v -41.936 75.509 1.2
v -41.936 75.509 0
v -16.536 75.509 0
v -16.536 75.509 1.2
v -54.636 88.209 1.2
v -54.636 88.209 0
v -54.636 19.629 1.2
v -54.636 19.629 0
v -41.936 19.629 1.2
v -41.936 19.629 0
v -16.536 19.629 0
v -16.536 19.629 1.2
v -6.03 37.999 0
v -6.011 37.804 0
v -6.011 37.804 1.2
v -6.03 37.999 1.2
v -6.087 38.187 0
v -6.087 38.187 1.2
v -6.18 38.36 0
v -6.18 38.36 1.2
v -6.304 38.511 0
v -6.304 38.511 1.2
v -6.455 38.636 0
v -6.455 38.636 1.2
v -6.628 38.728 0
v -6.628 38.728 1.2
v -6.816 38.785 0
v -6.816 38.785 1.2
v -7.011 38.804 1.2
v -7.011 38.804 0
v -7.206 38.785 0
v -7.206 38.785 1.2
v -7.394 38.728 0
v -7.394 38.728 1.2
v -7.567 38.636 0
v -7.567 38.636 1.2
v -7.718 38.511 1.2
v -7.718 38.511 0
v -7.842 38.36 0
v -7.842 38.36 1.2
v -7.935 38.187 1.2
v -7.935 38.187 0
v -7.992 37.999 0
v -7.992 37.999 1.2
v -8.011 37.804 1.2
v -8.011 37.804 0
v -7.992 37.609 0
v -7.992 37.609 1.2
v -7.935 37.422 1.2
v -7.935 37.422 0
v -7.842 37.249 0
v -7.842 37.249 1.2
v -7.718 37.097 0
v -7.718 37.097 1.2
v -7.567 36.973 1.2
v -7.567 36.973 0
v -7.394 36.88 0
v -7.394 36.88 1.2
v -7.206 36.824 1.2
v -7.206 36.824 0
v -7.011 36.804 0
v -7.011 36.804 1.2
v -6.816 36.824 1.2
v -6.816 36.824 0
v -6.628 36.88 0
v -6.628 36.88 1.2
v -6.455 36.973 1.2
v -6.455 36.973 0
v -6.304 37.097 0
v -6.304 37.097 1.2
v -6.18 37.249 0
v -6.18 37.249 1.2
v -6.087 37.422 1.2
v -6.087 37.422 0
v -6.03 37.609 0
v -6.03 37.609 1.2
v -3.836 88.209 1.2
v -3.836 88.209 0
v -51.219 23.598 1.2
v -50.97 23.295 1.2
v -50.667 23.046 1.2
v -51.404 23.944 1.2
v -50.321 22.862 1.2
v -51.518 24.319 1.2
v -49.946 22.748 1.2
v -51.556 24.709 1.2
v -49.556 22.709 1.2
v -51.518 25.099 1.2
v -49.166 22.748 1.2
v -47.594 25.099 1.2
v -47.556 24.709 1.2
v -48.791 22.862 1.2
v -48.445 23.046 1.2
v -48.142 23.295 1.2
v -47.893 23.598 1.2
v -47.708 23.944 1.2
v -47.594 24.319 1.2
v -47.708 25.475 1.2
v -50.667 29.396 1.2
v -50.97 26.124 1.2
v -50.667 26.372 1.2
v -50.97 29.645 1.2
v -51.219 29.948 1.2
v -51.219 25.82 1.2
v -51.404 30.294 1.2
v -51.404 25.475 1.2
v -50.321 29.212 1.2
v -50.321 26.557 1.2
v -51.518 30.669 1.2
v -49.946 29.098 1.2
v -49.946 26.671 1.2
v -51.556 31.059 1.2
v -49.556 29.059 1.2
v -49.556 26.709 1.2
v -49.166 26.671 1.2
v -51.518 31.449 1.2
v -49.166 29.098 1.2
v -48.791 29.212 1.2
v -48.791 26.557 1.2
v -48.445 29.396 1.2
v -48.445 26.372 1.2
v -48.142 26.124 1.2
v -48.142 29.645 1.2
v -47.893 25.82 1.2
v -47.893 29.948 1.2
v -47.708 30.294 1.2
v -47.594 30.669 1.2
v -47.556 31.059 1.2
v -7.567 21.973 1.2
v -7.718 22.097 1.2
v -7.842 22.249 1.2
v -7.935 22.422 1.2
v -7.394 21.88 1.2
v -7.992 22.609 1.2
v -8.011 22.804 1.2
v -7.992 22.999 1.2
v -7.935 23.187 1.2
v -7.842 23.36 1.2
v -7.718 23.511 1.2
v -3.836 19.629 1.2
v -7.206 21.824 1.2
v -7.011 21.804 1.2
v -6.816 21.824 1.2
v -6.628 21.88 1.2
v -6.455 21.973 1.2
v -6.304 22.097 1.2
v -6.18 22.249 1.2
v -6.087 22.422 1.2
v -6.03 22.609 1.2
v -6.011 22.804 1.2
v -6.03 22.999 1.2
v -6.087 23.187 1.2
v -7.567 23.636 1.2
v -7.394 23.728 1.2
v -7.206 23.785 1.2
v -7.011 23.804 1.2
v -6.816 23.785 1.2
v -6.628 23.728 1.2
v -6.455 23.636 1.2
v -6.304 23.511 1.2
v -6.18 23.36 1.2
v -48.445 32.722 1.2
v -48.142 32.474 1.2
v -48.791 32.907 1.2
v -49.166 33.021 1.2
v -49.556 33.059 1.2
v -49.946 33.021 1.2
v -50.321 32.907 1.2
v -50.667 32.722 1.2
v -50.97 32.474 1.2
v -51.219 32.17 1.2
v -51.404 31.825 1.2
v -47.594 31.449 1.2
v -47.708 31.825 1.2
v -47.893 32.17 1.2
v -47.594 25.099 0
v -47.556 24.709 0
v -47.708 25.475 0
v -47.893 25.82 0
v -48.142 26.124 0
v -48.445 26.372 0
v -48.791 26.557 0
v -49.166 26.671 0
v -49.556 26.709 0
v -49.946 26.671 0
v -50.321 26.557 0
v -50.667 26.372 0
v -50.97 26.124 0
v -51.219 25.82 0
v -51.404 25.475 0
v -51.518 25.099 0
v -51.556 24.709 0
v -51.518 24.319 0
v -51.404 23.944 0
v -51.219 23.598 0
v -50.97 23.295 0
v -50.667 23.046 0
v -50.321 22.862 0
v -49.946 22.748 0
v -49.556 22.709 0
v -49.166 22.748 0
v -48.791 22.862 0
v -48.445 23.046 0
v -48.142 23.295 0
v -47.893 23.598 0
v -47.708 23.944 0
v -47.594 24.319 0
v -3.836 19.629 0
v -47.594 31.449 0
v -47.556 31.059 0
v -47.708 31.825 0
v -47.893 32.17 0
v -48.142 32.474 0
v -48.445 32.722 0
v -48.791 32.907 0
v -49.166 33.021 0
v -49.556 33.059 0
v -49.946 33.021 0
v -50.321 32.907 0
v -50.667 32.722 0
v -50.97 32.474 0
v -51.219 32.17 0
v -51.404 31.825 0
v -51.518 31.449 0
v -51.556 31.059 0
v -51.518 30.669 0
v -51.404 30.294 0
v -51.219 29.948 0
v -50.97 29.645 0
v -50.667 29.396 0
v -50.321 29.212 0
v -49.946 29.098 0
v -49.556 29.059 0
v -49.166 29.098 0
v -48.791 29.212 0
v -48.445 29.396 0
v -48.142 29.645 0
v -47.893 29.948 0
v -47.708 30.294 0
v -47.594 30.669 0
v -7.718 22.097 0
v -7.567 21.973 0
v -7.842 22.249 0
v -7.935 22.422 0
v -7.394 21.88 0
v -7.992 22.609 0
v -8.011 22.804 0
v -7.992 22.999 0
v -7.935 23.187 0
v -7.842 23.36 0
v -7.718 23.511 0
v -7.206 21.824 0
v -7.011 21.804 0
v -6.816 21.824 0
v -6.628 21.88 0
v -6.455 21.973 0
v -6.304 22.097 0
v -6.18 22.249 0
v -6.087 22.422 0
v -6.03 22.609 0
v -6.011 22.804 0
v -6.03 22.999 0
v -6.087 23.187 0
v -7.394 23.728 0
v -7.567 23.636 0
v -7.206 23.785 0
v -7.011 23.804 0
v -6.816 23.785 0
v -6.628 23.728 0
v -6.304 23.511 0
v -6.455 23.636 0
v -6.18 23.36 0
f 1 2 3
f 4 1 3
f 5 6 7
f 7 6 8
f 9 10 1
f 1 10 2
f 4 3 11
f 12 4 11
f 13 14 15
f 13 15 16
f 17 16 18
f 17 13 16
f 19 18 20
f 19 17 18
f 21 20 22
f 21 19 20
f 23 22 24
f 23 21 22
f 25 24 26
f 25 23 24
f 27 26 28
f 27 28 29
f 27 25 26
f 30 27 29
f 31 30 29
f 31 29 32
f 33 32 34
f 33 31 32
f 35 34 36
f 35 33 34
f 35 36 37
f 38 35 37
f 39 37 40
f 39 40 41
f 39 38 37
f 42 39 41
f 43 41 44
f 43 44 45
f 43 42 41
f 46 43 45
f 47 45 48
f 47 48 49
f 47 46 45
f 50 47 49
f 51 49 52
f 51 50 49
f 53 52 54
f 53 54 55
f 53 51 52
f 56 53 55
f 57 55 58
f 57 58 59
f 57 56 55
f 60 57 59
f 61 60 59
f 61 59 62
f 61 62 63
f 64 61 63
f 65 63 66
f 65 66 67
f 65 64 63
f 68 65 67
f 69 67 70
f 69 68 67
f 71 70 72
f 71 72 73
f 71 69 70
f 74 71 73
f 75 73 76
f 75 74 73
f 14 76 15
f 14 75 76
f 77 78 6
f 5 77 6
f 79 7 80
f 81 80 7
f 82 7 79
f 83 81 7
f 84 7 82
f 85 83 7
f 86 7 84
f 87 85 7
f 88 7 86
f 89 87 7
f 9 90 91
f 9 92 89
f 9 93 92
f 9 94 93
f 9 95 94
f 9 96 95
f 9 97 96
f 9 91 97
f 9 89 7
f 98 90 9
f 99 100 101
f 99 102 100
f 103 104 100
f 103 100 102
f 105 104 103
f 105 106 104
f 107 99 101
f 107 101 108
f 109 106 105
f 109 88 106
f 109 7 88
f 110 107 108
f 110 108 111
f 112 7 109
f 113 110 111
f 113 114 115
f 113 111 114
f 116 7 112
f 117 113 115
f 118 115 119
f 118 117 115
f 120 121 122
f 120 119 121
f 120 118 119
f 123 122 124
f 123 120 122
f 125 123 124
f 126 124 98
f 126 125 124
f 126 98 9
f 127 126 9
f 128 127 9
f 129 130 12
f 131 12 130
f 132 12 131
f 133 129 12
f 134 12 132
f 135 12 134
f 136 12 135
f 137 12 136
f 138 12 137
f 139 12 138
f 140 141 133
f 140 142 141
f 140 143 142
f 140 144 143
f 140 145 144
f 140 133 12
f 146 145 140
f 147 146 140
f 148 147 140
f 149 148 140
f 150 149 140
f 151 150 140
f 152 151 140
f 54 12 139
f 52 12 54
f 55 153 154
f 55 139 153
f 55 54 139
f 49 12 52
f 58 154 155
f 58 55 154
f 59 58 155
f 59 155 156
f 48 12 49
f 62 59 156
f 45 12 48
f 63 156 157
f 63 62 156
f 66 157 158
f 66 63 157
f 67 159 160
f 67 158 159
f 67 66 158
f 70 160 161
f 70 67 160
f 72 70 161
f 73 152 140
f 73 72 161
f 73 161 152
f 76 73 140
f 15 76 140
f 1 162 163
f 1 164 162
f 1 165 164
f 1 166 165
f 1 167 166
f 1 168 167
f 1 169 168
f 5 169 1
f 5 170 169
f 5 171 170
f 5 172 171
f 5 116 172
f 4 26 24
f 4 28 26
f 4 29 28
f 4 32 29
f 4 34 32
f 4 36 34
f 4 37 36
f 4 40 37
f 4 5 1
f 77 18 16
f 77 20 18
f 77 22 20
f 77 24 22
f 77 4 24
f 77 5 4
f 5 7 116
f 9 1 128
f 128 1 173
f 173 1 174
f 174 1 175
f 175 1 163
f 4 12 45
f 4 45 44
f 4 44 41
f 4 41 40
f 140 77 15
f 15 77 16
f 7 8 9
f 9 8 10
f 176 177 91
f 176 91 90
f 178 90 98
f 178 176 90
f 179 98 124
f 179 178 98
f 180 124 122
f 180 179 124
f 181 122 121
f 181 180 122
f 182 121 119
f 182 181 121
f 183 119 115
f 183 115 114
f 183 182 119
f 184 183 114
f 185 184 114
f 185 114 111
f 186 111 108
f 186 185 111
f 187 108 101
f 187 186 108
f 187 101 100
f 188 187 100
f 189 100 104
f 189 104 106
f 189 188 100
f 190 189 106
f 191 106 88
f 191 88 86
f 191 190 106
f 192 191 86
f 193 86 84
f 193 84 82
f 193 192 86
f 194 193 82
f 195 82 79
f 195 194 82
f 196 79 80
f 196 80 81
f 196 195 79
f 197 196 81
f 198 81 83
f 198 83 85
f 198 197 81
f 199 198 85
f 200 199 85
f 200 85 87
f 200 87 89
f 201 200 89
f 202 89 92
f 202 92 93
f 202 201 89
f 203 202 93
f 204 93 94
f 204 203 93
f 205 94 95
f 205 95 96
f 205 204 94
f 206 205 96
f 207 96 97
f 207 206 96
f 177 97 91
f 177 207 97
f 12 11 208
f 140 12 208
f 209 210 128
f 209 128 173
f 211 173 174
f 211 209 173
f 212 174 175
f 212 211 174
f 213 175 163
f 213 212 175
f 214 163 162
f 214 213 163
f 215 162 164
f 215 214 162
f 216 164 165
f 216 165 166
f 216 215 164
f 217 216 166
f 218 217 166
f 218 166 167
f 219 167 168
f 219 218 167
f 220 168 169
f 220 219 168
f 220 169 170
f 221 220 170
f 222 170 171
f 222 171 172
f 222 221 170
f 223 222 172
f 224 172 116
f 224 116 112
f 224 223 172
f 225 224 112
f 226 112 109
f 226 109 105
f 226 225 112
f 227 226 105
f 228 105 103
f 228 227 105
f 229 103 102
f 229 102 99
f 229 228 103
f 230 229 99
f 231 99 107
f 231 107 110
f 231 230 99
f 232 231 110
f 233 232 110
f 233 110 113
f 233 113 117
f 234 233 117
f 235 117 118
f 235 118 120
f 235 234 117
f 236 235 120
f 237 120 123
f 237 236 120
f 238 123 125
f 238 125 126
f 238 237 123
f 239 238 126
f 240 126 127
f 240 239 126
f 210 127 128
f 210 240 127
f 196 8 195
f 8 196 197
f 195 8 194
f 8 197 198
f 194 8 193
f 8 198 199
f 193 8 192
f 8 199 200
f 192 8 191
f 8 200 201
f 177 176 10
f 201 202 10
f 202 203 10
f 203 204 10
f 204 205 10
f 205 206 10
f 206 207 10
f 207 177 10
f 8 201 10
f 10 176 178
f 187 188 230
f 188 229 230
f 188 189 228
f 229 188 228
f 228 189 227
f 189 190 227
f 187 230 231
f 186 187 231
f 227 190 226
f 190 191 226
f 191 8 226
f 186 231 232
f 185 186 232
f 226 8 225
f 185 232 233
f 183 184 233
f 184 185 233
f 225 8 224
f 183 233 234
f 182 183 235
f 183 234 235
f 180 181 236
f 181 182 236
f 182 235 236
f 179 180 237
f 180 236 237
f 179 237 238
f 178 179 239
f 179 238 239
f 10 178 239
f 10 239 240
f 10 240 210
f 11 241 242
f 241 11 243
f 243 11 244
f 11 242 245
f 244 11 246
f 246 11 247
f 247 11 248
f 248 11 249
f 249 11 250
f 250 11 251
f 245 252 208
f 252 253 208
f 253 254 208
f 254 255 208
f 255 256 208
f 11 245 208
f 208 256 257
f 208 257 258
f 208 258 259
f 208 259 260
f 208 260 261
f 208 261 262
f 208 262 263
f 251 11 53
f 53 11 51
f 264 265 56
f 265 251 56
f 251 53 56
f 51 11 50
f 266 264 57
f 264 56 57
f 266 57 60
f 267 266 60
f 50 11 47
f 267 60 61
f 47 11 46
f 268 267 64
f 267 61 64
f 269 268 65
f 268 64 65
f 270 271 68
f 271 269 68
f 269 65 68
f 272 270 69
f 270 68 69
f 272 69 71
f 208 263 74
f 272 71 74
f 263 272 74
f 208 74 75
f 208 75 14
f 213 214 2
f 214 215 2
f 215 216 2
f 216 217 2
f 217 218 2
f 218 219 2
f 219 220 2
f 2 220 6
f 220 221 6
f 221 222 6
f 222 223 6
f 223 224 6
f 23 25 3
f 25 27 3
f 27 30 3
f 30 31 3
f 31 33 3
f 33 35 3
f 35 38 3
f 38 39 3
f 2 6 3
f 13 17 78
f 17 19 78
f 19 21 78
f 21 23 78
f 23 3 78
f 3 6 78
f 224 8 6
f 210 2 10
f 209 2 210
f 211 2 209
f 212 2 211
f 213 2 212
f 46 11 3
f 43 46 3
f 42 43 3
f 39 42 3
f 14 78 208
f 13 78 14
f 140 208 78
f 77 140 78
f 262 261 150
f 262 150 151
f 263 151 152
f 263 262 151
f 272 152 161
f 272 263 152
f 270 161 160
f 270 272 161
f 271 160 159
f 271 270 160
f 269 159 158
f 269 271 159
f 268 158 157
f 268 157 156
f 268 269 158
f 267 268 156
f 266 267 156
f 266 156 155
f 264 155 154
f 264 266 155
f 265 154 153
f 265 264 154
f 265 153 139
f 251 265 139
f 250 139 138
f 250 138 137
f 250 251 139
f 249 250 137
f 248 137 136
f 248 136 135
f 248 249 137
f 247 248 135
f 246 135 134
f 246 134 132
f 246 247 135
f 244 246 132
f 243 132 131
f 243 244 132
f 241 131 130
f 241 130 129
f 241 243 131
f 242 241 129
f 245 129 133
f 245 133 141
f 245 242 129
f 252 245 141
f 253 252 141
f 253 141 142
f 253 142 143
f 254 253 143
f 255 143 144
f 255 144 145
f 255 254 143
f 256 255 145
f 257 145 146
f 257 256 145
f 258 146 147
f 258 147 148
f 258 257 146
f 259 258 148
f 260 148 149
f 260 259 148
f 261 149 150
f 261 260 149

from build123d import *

# Parameters (mm, degrees)
F0_R     = 2
F0_R_2   = 1
F1_DEPTH = 1.2


with BuildPart() as f1:
    # F0 (on Top) → F1 (new body)
    with BuildSketch(Plane.XY):
        Polygon((-41.936022, 88.209298), (-54.636022, 88.209298), (-54.636022, 19.629298), (-41.936022, 19.629298), (-41.936022, 75.509298), (-16.536022, 75.509298), (-16.536022, 19.629298), (-3.836022, 19.629298), (-3.836022, 88.209298), (-16.536022, 88.209298), align=None)
        with Locations((-49.556022, 24.709298)):
            Circle(F0_R, mode=Mode.SUBTRACT)
        with Locations((-49.556022, 31.059298)):
            Circle(F0_R, mode=Mode.SUBTRACT)
        with Locations((-7.011022, 22.804298)):
            Circle(F0_R_2, mode=Mode.SUBTRACT)
        with Locations((-7.011022, 37.804298)):
            Circle(F0_R_2, mode=Mode.SUBTRACT)
    extrude(amount=F1_DEPTH)


solid = f1.part
